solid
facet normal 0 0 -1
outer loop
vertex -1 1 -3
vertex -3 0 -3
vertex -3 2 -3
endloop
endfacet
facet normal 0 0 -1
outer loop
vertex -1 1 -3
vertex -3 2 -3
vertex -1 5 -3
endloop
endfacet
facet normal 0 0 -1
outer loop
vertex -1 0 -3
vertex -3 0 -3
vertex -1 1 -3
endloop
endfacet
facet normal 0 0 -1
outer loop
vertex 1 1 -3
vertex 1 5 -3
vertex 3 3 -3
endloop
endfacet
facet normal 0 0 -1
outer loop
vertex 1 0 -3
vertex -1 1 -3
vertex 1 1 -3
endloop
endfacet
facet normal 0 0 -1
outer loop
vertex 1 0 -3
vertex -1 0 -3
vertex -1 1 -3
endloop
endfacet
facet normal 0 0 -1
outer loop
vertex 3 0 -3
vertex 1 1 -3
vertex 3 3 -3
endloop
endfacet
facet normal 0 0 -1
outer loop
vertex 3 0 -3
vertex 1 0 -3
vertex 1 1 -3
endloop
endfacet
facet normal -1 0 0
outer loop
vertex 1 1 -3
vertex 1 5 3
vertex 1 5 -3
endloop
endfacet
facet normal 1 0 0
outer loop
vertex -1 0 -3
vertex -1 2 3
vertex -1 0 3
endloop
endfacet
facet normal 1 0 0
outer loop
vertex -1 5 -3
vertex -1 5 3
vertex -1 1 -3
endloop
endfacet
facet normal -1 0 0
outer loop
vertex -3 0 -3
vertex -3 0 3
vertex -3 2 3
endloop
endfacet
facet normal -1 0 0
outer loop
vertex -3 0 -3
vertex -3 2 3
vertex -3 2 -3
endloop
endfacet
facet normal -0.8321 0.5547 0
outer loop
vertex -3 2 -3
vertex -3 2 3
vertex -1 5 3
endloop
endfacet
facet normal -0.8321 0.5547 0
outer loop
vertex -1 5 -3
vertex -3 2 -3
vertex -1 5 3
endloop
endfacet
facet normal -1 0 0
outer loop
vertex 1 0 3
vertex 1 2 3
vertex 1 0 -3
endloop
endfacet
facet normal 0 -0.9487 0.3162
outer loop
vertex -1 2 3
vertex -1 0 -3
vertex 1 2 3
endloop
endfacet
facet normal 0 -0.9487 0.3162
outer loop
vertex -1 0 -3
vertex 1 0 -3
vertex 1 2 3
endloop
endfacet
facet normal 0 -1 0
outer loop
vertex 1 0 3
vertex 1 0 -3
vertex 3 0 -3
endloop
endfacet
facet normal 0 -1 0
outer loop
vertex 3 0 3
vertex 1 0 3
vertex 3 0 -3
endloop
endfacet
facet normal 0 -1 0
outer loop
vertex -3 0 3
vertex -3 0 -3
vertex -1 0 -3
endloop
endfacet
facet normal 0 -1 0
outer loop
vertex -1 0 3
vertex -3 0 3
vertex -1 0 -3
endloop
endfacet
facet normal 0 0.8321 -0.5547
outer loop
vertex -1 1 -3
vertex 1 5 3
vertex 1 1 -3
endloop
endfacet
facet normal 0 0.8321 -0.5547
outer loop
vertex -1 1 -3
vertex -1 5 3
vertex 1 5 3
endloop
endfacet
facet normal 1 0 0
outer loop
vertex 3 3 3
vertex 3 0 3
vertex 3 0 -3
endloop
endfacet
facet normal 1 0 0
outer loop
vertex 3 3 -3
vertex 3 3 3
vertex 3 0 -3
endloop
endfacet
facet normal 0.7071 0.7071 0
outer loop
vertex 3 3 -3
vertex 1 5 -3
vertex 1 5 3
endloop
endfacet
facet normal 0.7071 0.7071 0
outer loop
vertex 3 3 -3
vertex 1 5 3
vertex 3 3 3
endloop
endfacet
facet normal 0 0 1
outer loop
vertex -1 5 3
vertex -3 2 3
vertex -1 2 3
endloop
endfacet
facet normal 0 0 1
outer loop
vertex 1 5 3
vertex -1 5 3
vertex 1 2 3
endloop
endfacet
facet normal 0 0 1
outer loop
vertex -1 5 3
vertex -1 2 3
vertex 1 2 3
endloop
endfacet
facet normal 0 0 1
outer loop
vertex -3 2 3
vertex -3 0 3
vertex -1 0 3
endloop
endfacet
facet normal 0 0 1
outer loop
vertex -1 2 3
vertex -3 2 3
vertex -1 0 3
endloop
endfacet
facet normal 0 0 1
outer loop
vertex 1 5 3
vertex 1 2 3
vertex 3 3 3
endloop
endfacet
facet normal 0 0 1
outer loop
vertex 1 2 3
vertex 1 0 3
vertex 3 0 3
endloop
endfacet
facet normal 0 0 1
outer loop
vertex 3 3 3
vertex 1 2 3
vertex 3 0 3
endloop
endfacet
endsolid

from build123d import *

# Parameters (mm, degrees)
SKETCH1_W           = 6
SKETCH1_H           = 6
BOSS_EXTRUDE1_DEPTH = 5
CUT_EXTRUDE8_DEPTH  = 1
CUT_EXTRUDE11_DEPTH = 12


with BuildPart() as part:
    # Sketch1 → Boss-Extrude1 (new body)
    with BuildSketch(Plane(origin=(0, 0, 0), x_dir=(1, 0, 0), z_dir=(0, 1, 0))):
        Rectangle(SKETCH1_W, SKETCH1_H)
    extrude(amount=BOSS_EXTRUDE1_DEPTH)

    # Sketch9 → Cut-Extrude8 (cut, symmetric)
    with BuildSketch(Plane(origin=(0, 0, 0), x_dir=(0, 0, -1), z_dir=(1, 0, 0))):
        Polygon((3, 5), (-3, 5), (3, 1), align=None)
        Polygon((3, 0), (-3, 2), (-3, 0), align=None)
    extrude(amount=CUT_EXTRUDE8_DEPTH, both=True, mode=Mode.SUBTRACT)

    # Sketch10 → Cut-Extrude11 (cut)
    with BuildSketch(Plane.XY.offset(3)):
        Polygon((-3, 2), (-1, 5), (-3, 5), align=None)
        Polygon((3, 5), (1, 5), (3, 3), align=None)
    extrude(amount=-CUT_EXTRUDE11_DEPTH, mode=Mode.SUBTRACT)


solid = part.part
